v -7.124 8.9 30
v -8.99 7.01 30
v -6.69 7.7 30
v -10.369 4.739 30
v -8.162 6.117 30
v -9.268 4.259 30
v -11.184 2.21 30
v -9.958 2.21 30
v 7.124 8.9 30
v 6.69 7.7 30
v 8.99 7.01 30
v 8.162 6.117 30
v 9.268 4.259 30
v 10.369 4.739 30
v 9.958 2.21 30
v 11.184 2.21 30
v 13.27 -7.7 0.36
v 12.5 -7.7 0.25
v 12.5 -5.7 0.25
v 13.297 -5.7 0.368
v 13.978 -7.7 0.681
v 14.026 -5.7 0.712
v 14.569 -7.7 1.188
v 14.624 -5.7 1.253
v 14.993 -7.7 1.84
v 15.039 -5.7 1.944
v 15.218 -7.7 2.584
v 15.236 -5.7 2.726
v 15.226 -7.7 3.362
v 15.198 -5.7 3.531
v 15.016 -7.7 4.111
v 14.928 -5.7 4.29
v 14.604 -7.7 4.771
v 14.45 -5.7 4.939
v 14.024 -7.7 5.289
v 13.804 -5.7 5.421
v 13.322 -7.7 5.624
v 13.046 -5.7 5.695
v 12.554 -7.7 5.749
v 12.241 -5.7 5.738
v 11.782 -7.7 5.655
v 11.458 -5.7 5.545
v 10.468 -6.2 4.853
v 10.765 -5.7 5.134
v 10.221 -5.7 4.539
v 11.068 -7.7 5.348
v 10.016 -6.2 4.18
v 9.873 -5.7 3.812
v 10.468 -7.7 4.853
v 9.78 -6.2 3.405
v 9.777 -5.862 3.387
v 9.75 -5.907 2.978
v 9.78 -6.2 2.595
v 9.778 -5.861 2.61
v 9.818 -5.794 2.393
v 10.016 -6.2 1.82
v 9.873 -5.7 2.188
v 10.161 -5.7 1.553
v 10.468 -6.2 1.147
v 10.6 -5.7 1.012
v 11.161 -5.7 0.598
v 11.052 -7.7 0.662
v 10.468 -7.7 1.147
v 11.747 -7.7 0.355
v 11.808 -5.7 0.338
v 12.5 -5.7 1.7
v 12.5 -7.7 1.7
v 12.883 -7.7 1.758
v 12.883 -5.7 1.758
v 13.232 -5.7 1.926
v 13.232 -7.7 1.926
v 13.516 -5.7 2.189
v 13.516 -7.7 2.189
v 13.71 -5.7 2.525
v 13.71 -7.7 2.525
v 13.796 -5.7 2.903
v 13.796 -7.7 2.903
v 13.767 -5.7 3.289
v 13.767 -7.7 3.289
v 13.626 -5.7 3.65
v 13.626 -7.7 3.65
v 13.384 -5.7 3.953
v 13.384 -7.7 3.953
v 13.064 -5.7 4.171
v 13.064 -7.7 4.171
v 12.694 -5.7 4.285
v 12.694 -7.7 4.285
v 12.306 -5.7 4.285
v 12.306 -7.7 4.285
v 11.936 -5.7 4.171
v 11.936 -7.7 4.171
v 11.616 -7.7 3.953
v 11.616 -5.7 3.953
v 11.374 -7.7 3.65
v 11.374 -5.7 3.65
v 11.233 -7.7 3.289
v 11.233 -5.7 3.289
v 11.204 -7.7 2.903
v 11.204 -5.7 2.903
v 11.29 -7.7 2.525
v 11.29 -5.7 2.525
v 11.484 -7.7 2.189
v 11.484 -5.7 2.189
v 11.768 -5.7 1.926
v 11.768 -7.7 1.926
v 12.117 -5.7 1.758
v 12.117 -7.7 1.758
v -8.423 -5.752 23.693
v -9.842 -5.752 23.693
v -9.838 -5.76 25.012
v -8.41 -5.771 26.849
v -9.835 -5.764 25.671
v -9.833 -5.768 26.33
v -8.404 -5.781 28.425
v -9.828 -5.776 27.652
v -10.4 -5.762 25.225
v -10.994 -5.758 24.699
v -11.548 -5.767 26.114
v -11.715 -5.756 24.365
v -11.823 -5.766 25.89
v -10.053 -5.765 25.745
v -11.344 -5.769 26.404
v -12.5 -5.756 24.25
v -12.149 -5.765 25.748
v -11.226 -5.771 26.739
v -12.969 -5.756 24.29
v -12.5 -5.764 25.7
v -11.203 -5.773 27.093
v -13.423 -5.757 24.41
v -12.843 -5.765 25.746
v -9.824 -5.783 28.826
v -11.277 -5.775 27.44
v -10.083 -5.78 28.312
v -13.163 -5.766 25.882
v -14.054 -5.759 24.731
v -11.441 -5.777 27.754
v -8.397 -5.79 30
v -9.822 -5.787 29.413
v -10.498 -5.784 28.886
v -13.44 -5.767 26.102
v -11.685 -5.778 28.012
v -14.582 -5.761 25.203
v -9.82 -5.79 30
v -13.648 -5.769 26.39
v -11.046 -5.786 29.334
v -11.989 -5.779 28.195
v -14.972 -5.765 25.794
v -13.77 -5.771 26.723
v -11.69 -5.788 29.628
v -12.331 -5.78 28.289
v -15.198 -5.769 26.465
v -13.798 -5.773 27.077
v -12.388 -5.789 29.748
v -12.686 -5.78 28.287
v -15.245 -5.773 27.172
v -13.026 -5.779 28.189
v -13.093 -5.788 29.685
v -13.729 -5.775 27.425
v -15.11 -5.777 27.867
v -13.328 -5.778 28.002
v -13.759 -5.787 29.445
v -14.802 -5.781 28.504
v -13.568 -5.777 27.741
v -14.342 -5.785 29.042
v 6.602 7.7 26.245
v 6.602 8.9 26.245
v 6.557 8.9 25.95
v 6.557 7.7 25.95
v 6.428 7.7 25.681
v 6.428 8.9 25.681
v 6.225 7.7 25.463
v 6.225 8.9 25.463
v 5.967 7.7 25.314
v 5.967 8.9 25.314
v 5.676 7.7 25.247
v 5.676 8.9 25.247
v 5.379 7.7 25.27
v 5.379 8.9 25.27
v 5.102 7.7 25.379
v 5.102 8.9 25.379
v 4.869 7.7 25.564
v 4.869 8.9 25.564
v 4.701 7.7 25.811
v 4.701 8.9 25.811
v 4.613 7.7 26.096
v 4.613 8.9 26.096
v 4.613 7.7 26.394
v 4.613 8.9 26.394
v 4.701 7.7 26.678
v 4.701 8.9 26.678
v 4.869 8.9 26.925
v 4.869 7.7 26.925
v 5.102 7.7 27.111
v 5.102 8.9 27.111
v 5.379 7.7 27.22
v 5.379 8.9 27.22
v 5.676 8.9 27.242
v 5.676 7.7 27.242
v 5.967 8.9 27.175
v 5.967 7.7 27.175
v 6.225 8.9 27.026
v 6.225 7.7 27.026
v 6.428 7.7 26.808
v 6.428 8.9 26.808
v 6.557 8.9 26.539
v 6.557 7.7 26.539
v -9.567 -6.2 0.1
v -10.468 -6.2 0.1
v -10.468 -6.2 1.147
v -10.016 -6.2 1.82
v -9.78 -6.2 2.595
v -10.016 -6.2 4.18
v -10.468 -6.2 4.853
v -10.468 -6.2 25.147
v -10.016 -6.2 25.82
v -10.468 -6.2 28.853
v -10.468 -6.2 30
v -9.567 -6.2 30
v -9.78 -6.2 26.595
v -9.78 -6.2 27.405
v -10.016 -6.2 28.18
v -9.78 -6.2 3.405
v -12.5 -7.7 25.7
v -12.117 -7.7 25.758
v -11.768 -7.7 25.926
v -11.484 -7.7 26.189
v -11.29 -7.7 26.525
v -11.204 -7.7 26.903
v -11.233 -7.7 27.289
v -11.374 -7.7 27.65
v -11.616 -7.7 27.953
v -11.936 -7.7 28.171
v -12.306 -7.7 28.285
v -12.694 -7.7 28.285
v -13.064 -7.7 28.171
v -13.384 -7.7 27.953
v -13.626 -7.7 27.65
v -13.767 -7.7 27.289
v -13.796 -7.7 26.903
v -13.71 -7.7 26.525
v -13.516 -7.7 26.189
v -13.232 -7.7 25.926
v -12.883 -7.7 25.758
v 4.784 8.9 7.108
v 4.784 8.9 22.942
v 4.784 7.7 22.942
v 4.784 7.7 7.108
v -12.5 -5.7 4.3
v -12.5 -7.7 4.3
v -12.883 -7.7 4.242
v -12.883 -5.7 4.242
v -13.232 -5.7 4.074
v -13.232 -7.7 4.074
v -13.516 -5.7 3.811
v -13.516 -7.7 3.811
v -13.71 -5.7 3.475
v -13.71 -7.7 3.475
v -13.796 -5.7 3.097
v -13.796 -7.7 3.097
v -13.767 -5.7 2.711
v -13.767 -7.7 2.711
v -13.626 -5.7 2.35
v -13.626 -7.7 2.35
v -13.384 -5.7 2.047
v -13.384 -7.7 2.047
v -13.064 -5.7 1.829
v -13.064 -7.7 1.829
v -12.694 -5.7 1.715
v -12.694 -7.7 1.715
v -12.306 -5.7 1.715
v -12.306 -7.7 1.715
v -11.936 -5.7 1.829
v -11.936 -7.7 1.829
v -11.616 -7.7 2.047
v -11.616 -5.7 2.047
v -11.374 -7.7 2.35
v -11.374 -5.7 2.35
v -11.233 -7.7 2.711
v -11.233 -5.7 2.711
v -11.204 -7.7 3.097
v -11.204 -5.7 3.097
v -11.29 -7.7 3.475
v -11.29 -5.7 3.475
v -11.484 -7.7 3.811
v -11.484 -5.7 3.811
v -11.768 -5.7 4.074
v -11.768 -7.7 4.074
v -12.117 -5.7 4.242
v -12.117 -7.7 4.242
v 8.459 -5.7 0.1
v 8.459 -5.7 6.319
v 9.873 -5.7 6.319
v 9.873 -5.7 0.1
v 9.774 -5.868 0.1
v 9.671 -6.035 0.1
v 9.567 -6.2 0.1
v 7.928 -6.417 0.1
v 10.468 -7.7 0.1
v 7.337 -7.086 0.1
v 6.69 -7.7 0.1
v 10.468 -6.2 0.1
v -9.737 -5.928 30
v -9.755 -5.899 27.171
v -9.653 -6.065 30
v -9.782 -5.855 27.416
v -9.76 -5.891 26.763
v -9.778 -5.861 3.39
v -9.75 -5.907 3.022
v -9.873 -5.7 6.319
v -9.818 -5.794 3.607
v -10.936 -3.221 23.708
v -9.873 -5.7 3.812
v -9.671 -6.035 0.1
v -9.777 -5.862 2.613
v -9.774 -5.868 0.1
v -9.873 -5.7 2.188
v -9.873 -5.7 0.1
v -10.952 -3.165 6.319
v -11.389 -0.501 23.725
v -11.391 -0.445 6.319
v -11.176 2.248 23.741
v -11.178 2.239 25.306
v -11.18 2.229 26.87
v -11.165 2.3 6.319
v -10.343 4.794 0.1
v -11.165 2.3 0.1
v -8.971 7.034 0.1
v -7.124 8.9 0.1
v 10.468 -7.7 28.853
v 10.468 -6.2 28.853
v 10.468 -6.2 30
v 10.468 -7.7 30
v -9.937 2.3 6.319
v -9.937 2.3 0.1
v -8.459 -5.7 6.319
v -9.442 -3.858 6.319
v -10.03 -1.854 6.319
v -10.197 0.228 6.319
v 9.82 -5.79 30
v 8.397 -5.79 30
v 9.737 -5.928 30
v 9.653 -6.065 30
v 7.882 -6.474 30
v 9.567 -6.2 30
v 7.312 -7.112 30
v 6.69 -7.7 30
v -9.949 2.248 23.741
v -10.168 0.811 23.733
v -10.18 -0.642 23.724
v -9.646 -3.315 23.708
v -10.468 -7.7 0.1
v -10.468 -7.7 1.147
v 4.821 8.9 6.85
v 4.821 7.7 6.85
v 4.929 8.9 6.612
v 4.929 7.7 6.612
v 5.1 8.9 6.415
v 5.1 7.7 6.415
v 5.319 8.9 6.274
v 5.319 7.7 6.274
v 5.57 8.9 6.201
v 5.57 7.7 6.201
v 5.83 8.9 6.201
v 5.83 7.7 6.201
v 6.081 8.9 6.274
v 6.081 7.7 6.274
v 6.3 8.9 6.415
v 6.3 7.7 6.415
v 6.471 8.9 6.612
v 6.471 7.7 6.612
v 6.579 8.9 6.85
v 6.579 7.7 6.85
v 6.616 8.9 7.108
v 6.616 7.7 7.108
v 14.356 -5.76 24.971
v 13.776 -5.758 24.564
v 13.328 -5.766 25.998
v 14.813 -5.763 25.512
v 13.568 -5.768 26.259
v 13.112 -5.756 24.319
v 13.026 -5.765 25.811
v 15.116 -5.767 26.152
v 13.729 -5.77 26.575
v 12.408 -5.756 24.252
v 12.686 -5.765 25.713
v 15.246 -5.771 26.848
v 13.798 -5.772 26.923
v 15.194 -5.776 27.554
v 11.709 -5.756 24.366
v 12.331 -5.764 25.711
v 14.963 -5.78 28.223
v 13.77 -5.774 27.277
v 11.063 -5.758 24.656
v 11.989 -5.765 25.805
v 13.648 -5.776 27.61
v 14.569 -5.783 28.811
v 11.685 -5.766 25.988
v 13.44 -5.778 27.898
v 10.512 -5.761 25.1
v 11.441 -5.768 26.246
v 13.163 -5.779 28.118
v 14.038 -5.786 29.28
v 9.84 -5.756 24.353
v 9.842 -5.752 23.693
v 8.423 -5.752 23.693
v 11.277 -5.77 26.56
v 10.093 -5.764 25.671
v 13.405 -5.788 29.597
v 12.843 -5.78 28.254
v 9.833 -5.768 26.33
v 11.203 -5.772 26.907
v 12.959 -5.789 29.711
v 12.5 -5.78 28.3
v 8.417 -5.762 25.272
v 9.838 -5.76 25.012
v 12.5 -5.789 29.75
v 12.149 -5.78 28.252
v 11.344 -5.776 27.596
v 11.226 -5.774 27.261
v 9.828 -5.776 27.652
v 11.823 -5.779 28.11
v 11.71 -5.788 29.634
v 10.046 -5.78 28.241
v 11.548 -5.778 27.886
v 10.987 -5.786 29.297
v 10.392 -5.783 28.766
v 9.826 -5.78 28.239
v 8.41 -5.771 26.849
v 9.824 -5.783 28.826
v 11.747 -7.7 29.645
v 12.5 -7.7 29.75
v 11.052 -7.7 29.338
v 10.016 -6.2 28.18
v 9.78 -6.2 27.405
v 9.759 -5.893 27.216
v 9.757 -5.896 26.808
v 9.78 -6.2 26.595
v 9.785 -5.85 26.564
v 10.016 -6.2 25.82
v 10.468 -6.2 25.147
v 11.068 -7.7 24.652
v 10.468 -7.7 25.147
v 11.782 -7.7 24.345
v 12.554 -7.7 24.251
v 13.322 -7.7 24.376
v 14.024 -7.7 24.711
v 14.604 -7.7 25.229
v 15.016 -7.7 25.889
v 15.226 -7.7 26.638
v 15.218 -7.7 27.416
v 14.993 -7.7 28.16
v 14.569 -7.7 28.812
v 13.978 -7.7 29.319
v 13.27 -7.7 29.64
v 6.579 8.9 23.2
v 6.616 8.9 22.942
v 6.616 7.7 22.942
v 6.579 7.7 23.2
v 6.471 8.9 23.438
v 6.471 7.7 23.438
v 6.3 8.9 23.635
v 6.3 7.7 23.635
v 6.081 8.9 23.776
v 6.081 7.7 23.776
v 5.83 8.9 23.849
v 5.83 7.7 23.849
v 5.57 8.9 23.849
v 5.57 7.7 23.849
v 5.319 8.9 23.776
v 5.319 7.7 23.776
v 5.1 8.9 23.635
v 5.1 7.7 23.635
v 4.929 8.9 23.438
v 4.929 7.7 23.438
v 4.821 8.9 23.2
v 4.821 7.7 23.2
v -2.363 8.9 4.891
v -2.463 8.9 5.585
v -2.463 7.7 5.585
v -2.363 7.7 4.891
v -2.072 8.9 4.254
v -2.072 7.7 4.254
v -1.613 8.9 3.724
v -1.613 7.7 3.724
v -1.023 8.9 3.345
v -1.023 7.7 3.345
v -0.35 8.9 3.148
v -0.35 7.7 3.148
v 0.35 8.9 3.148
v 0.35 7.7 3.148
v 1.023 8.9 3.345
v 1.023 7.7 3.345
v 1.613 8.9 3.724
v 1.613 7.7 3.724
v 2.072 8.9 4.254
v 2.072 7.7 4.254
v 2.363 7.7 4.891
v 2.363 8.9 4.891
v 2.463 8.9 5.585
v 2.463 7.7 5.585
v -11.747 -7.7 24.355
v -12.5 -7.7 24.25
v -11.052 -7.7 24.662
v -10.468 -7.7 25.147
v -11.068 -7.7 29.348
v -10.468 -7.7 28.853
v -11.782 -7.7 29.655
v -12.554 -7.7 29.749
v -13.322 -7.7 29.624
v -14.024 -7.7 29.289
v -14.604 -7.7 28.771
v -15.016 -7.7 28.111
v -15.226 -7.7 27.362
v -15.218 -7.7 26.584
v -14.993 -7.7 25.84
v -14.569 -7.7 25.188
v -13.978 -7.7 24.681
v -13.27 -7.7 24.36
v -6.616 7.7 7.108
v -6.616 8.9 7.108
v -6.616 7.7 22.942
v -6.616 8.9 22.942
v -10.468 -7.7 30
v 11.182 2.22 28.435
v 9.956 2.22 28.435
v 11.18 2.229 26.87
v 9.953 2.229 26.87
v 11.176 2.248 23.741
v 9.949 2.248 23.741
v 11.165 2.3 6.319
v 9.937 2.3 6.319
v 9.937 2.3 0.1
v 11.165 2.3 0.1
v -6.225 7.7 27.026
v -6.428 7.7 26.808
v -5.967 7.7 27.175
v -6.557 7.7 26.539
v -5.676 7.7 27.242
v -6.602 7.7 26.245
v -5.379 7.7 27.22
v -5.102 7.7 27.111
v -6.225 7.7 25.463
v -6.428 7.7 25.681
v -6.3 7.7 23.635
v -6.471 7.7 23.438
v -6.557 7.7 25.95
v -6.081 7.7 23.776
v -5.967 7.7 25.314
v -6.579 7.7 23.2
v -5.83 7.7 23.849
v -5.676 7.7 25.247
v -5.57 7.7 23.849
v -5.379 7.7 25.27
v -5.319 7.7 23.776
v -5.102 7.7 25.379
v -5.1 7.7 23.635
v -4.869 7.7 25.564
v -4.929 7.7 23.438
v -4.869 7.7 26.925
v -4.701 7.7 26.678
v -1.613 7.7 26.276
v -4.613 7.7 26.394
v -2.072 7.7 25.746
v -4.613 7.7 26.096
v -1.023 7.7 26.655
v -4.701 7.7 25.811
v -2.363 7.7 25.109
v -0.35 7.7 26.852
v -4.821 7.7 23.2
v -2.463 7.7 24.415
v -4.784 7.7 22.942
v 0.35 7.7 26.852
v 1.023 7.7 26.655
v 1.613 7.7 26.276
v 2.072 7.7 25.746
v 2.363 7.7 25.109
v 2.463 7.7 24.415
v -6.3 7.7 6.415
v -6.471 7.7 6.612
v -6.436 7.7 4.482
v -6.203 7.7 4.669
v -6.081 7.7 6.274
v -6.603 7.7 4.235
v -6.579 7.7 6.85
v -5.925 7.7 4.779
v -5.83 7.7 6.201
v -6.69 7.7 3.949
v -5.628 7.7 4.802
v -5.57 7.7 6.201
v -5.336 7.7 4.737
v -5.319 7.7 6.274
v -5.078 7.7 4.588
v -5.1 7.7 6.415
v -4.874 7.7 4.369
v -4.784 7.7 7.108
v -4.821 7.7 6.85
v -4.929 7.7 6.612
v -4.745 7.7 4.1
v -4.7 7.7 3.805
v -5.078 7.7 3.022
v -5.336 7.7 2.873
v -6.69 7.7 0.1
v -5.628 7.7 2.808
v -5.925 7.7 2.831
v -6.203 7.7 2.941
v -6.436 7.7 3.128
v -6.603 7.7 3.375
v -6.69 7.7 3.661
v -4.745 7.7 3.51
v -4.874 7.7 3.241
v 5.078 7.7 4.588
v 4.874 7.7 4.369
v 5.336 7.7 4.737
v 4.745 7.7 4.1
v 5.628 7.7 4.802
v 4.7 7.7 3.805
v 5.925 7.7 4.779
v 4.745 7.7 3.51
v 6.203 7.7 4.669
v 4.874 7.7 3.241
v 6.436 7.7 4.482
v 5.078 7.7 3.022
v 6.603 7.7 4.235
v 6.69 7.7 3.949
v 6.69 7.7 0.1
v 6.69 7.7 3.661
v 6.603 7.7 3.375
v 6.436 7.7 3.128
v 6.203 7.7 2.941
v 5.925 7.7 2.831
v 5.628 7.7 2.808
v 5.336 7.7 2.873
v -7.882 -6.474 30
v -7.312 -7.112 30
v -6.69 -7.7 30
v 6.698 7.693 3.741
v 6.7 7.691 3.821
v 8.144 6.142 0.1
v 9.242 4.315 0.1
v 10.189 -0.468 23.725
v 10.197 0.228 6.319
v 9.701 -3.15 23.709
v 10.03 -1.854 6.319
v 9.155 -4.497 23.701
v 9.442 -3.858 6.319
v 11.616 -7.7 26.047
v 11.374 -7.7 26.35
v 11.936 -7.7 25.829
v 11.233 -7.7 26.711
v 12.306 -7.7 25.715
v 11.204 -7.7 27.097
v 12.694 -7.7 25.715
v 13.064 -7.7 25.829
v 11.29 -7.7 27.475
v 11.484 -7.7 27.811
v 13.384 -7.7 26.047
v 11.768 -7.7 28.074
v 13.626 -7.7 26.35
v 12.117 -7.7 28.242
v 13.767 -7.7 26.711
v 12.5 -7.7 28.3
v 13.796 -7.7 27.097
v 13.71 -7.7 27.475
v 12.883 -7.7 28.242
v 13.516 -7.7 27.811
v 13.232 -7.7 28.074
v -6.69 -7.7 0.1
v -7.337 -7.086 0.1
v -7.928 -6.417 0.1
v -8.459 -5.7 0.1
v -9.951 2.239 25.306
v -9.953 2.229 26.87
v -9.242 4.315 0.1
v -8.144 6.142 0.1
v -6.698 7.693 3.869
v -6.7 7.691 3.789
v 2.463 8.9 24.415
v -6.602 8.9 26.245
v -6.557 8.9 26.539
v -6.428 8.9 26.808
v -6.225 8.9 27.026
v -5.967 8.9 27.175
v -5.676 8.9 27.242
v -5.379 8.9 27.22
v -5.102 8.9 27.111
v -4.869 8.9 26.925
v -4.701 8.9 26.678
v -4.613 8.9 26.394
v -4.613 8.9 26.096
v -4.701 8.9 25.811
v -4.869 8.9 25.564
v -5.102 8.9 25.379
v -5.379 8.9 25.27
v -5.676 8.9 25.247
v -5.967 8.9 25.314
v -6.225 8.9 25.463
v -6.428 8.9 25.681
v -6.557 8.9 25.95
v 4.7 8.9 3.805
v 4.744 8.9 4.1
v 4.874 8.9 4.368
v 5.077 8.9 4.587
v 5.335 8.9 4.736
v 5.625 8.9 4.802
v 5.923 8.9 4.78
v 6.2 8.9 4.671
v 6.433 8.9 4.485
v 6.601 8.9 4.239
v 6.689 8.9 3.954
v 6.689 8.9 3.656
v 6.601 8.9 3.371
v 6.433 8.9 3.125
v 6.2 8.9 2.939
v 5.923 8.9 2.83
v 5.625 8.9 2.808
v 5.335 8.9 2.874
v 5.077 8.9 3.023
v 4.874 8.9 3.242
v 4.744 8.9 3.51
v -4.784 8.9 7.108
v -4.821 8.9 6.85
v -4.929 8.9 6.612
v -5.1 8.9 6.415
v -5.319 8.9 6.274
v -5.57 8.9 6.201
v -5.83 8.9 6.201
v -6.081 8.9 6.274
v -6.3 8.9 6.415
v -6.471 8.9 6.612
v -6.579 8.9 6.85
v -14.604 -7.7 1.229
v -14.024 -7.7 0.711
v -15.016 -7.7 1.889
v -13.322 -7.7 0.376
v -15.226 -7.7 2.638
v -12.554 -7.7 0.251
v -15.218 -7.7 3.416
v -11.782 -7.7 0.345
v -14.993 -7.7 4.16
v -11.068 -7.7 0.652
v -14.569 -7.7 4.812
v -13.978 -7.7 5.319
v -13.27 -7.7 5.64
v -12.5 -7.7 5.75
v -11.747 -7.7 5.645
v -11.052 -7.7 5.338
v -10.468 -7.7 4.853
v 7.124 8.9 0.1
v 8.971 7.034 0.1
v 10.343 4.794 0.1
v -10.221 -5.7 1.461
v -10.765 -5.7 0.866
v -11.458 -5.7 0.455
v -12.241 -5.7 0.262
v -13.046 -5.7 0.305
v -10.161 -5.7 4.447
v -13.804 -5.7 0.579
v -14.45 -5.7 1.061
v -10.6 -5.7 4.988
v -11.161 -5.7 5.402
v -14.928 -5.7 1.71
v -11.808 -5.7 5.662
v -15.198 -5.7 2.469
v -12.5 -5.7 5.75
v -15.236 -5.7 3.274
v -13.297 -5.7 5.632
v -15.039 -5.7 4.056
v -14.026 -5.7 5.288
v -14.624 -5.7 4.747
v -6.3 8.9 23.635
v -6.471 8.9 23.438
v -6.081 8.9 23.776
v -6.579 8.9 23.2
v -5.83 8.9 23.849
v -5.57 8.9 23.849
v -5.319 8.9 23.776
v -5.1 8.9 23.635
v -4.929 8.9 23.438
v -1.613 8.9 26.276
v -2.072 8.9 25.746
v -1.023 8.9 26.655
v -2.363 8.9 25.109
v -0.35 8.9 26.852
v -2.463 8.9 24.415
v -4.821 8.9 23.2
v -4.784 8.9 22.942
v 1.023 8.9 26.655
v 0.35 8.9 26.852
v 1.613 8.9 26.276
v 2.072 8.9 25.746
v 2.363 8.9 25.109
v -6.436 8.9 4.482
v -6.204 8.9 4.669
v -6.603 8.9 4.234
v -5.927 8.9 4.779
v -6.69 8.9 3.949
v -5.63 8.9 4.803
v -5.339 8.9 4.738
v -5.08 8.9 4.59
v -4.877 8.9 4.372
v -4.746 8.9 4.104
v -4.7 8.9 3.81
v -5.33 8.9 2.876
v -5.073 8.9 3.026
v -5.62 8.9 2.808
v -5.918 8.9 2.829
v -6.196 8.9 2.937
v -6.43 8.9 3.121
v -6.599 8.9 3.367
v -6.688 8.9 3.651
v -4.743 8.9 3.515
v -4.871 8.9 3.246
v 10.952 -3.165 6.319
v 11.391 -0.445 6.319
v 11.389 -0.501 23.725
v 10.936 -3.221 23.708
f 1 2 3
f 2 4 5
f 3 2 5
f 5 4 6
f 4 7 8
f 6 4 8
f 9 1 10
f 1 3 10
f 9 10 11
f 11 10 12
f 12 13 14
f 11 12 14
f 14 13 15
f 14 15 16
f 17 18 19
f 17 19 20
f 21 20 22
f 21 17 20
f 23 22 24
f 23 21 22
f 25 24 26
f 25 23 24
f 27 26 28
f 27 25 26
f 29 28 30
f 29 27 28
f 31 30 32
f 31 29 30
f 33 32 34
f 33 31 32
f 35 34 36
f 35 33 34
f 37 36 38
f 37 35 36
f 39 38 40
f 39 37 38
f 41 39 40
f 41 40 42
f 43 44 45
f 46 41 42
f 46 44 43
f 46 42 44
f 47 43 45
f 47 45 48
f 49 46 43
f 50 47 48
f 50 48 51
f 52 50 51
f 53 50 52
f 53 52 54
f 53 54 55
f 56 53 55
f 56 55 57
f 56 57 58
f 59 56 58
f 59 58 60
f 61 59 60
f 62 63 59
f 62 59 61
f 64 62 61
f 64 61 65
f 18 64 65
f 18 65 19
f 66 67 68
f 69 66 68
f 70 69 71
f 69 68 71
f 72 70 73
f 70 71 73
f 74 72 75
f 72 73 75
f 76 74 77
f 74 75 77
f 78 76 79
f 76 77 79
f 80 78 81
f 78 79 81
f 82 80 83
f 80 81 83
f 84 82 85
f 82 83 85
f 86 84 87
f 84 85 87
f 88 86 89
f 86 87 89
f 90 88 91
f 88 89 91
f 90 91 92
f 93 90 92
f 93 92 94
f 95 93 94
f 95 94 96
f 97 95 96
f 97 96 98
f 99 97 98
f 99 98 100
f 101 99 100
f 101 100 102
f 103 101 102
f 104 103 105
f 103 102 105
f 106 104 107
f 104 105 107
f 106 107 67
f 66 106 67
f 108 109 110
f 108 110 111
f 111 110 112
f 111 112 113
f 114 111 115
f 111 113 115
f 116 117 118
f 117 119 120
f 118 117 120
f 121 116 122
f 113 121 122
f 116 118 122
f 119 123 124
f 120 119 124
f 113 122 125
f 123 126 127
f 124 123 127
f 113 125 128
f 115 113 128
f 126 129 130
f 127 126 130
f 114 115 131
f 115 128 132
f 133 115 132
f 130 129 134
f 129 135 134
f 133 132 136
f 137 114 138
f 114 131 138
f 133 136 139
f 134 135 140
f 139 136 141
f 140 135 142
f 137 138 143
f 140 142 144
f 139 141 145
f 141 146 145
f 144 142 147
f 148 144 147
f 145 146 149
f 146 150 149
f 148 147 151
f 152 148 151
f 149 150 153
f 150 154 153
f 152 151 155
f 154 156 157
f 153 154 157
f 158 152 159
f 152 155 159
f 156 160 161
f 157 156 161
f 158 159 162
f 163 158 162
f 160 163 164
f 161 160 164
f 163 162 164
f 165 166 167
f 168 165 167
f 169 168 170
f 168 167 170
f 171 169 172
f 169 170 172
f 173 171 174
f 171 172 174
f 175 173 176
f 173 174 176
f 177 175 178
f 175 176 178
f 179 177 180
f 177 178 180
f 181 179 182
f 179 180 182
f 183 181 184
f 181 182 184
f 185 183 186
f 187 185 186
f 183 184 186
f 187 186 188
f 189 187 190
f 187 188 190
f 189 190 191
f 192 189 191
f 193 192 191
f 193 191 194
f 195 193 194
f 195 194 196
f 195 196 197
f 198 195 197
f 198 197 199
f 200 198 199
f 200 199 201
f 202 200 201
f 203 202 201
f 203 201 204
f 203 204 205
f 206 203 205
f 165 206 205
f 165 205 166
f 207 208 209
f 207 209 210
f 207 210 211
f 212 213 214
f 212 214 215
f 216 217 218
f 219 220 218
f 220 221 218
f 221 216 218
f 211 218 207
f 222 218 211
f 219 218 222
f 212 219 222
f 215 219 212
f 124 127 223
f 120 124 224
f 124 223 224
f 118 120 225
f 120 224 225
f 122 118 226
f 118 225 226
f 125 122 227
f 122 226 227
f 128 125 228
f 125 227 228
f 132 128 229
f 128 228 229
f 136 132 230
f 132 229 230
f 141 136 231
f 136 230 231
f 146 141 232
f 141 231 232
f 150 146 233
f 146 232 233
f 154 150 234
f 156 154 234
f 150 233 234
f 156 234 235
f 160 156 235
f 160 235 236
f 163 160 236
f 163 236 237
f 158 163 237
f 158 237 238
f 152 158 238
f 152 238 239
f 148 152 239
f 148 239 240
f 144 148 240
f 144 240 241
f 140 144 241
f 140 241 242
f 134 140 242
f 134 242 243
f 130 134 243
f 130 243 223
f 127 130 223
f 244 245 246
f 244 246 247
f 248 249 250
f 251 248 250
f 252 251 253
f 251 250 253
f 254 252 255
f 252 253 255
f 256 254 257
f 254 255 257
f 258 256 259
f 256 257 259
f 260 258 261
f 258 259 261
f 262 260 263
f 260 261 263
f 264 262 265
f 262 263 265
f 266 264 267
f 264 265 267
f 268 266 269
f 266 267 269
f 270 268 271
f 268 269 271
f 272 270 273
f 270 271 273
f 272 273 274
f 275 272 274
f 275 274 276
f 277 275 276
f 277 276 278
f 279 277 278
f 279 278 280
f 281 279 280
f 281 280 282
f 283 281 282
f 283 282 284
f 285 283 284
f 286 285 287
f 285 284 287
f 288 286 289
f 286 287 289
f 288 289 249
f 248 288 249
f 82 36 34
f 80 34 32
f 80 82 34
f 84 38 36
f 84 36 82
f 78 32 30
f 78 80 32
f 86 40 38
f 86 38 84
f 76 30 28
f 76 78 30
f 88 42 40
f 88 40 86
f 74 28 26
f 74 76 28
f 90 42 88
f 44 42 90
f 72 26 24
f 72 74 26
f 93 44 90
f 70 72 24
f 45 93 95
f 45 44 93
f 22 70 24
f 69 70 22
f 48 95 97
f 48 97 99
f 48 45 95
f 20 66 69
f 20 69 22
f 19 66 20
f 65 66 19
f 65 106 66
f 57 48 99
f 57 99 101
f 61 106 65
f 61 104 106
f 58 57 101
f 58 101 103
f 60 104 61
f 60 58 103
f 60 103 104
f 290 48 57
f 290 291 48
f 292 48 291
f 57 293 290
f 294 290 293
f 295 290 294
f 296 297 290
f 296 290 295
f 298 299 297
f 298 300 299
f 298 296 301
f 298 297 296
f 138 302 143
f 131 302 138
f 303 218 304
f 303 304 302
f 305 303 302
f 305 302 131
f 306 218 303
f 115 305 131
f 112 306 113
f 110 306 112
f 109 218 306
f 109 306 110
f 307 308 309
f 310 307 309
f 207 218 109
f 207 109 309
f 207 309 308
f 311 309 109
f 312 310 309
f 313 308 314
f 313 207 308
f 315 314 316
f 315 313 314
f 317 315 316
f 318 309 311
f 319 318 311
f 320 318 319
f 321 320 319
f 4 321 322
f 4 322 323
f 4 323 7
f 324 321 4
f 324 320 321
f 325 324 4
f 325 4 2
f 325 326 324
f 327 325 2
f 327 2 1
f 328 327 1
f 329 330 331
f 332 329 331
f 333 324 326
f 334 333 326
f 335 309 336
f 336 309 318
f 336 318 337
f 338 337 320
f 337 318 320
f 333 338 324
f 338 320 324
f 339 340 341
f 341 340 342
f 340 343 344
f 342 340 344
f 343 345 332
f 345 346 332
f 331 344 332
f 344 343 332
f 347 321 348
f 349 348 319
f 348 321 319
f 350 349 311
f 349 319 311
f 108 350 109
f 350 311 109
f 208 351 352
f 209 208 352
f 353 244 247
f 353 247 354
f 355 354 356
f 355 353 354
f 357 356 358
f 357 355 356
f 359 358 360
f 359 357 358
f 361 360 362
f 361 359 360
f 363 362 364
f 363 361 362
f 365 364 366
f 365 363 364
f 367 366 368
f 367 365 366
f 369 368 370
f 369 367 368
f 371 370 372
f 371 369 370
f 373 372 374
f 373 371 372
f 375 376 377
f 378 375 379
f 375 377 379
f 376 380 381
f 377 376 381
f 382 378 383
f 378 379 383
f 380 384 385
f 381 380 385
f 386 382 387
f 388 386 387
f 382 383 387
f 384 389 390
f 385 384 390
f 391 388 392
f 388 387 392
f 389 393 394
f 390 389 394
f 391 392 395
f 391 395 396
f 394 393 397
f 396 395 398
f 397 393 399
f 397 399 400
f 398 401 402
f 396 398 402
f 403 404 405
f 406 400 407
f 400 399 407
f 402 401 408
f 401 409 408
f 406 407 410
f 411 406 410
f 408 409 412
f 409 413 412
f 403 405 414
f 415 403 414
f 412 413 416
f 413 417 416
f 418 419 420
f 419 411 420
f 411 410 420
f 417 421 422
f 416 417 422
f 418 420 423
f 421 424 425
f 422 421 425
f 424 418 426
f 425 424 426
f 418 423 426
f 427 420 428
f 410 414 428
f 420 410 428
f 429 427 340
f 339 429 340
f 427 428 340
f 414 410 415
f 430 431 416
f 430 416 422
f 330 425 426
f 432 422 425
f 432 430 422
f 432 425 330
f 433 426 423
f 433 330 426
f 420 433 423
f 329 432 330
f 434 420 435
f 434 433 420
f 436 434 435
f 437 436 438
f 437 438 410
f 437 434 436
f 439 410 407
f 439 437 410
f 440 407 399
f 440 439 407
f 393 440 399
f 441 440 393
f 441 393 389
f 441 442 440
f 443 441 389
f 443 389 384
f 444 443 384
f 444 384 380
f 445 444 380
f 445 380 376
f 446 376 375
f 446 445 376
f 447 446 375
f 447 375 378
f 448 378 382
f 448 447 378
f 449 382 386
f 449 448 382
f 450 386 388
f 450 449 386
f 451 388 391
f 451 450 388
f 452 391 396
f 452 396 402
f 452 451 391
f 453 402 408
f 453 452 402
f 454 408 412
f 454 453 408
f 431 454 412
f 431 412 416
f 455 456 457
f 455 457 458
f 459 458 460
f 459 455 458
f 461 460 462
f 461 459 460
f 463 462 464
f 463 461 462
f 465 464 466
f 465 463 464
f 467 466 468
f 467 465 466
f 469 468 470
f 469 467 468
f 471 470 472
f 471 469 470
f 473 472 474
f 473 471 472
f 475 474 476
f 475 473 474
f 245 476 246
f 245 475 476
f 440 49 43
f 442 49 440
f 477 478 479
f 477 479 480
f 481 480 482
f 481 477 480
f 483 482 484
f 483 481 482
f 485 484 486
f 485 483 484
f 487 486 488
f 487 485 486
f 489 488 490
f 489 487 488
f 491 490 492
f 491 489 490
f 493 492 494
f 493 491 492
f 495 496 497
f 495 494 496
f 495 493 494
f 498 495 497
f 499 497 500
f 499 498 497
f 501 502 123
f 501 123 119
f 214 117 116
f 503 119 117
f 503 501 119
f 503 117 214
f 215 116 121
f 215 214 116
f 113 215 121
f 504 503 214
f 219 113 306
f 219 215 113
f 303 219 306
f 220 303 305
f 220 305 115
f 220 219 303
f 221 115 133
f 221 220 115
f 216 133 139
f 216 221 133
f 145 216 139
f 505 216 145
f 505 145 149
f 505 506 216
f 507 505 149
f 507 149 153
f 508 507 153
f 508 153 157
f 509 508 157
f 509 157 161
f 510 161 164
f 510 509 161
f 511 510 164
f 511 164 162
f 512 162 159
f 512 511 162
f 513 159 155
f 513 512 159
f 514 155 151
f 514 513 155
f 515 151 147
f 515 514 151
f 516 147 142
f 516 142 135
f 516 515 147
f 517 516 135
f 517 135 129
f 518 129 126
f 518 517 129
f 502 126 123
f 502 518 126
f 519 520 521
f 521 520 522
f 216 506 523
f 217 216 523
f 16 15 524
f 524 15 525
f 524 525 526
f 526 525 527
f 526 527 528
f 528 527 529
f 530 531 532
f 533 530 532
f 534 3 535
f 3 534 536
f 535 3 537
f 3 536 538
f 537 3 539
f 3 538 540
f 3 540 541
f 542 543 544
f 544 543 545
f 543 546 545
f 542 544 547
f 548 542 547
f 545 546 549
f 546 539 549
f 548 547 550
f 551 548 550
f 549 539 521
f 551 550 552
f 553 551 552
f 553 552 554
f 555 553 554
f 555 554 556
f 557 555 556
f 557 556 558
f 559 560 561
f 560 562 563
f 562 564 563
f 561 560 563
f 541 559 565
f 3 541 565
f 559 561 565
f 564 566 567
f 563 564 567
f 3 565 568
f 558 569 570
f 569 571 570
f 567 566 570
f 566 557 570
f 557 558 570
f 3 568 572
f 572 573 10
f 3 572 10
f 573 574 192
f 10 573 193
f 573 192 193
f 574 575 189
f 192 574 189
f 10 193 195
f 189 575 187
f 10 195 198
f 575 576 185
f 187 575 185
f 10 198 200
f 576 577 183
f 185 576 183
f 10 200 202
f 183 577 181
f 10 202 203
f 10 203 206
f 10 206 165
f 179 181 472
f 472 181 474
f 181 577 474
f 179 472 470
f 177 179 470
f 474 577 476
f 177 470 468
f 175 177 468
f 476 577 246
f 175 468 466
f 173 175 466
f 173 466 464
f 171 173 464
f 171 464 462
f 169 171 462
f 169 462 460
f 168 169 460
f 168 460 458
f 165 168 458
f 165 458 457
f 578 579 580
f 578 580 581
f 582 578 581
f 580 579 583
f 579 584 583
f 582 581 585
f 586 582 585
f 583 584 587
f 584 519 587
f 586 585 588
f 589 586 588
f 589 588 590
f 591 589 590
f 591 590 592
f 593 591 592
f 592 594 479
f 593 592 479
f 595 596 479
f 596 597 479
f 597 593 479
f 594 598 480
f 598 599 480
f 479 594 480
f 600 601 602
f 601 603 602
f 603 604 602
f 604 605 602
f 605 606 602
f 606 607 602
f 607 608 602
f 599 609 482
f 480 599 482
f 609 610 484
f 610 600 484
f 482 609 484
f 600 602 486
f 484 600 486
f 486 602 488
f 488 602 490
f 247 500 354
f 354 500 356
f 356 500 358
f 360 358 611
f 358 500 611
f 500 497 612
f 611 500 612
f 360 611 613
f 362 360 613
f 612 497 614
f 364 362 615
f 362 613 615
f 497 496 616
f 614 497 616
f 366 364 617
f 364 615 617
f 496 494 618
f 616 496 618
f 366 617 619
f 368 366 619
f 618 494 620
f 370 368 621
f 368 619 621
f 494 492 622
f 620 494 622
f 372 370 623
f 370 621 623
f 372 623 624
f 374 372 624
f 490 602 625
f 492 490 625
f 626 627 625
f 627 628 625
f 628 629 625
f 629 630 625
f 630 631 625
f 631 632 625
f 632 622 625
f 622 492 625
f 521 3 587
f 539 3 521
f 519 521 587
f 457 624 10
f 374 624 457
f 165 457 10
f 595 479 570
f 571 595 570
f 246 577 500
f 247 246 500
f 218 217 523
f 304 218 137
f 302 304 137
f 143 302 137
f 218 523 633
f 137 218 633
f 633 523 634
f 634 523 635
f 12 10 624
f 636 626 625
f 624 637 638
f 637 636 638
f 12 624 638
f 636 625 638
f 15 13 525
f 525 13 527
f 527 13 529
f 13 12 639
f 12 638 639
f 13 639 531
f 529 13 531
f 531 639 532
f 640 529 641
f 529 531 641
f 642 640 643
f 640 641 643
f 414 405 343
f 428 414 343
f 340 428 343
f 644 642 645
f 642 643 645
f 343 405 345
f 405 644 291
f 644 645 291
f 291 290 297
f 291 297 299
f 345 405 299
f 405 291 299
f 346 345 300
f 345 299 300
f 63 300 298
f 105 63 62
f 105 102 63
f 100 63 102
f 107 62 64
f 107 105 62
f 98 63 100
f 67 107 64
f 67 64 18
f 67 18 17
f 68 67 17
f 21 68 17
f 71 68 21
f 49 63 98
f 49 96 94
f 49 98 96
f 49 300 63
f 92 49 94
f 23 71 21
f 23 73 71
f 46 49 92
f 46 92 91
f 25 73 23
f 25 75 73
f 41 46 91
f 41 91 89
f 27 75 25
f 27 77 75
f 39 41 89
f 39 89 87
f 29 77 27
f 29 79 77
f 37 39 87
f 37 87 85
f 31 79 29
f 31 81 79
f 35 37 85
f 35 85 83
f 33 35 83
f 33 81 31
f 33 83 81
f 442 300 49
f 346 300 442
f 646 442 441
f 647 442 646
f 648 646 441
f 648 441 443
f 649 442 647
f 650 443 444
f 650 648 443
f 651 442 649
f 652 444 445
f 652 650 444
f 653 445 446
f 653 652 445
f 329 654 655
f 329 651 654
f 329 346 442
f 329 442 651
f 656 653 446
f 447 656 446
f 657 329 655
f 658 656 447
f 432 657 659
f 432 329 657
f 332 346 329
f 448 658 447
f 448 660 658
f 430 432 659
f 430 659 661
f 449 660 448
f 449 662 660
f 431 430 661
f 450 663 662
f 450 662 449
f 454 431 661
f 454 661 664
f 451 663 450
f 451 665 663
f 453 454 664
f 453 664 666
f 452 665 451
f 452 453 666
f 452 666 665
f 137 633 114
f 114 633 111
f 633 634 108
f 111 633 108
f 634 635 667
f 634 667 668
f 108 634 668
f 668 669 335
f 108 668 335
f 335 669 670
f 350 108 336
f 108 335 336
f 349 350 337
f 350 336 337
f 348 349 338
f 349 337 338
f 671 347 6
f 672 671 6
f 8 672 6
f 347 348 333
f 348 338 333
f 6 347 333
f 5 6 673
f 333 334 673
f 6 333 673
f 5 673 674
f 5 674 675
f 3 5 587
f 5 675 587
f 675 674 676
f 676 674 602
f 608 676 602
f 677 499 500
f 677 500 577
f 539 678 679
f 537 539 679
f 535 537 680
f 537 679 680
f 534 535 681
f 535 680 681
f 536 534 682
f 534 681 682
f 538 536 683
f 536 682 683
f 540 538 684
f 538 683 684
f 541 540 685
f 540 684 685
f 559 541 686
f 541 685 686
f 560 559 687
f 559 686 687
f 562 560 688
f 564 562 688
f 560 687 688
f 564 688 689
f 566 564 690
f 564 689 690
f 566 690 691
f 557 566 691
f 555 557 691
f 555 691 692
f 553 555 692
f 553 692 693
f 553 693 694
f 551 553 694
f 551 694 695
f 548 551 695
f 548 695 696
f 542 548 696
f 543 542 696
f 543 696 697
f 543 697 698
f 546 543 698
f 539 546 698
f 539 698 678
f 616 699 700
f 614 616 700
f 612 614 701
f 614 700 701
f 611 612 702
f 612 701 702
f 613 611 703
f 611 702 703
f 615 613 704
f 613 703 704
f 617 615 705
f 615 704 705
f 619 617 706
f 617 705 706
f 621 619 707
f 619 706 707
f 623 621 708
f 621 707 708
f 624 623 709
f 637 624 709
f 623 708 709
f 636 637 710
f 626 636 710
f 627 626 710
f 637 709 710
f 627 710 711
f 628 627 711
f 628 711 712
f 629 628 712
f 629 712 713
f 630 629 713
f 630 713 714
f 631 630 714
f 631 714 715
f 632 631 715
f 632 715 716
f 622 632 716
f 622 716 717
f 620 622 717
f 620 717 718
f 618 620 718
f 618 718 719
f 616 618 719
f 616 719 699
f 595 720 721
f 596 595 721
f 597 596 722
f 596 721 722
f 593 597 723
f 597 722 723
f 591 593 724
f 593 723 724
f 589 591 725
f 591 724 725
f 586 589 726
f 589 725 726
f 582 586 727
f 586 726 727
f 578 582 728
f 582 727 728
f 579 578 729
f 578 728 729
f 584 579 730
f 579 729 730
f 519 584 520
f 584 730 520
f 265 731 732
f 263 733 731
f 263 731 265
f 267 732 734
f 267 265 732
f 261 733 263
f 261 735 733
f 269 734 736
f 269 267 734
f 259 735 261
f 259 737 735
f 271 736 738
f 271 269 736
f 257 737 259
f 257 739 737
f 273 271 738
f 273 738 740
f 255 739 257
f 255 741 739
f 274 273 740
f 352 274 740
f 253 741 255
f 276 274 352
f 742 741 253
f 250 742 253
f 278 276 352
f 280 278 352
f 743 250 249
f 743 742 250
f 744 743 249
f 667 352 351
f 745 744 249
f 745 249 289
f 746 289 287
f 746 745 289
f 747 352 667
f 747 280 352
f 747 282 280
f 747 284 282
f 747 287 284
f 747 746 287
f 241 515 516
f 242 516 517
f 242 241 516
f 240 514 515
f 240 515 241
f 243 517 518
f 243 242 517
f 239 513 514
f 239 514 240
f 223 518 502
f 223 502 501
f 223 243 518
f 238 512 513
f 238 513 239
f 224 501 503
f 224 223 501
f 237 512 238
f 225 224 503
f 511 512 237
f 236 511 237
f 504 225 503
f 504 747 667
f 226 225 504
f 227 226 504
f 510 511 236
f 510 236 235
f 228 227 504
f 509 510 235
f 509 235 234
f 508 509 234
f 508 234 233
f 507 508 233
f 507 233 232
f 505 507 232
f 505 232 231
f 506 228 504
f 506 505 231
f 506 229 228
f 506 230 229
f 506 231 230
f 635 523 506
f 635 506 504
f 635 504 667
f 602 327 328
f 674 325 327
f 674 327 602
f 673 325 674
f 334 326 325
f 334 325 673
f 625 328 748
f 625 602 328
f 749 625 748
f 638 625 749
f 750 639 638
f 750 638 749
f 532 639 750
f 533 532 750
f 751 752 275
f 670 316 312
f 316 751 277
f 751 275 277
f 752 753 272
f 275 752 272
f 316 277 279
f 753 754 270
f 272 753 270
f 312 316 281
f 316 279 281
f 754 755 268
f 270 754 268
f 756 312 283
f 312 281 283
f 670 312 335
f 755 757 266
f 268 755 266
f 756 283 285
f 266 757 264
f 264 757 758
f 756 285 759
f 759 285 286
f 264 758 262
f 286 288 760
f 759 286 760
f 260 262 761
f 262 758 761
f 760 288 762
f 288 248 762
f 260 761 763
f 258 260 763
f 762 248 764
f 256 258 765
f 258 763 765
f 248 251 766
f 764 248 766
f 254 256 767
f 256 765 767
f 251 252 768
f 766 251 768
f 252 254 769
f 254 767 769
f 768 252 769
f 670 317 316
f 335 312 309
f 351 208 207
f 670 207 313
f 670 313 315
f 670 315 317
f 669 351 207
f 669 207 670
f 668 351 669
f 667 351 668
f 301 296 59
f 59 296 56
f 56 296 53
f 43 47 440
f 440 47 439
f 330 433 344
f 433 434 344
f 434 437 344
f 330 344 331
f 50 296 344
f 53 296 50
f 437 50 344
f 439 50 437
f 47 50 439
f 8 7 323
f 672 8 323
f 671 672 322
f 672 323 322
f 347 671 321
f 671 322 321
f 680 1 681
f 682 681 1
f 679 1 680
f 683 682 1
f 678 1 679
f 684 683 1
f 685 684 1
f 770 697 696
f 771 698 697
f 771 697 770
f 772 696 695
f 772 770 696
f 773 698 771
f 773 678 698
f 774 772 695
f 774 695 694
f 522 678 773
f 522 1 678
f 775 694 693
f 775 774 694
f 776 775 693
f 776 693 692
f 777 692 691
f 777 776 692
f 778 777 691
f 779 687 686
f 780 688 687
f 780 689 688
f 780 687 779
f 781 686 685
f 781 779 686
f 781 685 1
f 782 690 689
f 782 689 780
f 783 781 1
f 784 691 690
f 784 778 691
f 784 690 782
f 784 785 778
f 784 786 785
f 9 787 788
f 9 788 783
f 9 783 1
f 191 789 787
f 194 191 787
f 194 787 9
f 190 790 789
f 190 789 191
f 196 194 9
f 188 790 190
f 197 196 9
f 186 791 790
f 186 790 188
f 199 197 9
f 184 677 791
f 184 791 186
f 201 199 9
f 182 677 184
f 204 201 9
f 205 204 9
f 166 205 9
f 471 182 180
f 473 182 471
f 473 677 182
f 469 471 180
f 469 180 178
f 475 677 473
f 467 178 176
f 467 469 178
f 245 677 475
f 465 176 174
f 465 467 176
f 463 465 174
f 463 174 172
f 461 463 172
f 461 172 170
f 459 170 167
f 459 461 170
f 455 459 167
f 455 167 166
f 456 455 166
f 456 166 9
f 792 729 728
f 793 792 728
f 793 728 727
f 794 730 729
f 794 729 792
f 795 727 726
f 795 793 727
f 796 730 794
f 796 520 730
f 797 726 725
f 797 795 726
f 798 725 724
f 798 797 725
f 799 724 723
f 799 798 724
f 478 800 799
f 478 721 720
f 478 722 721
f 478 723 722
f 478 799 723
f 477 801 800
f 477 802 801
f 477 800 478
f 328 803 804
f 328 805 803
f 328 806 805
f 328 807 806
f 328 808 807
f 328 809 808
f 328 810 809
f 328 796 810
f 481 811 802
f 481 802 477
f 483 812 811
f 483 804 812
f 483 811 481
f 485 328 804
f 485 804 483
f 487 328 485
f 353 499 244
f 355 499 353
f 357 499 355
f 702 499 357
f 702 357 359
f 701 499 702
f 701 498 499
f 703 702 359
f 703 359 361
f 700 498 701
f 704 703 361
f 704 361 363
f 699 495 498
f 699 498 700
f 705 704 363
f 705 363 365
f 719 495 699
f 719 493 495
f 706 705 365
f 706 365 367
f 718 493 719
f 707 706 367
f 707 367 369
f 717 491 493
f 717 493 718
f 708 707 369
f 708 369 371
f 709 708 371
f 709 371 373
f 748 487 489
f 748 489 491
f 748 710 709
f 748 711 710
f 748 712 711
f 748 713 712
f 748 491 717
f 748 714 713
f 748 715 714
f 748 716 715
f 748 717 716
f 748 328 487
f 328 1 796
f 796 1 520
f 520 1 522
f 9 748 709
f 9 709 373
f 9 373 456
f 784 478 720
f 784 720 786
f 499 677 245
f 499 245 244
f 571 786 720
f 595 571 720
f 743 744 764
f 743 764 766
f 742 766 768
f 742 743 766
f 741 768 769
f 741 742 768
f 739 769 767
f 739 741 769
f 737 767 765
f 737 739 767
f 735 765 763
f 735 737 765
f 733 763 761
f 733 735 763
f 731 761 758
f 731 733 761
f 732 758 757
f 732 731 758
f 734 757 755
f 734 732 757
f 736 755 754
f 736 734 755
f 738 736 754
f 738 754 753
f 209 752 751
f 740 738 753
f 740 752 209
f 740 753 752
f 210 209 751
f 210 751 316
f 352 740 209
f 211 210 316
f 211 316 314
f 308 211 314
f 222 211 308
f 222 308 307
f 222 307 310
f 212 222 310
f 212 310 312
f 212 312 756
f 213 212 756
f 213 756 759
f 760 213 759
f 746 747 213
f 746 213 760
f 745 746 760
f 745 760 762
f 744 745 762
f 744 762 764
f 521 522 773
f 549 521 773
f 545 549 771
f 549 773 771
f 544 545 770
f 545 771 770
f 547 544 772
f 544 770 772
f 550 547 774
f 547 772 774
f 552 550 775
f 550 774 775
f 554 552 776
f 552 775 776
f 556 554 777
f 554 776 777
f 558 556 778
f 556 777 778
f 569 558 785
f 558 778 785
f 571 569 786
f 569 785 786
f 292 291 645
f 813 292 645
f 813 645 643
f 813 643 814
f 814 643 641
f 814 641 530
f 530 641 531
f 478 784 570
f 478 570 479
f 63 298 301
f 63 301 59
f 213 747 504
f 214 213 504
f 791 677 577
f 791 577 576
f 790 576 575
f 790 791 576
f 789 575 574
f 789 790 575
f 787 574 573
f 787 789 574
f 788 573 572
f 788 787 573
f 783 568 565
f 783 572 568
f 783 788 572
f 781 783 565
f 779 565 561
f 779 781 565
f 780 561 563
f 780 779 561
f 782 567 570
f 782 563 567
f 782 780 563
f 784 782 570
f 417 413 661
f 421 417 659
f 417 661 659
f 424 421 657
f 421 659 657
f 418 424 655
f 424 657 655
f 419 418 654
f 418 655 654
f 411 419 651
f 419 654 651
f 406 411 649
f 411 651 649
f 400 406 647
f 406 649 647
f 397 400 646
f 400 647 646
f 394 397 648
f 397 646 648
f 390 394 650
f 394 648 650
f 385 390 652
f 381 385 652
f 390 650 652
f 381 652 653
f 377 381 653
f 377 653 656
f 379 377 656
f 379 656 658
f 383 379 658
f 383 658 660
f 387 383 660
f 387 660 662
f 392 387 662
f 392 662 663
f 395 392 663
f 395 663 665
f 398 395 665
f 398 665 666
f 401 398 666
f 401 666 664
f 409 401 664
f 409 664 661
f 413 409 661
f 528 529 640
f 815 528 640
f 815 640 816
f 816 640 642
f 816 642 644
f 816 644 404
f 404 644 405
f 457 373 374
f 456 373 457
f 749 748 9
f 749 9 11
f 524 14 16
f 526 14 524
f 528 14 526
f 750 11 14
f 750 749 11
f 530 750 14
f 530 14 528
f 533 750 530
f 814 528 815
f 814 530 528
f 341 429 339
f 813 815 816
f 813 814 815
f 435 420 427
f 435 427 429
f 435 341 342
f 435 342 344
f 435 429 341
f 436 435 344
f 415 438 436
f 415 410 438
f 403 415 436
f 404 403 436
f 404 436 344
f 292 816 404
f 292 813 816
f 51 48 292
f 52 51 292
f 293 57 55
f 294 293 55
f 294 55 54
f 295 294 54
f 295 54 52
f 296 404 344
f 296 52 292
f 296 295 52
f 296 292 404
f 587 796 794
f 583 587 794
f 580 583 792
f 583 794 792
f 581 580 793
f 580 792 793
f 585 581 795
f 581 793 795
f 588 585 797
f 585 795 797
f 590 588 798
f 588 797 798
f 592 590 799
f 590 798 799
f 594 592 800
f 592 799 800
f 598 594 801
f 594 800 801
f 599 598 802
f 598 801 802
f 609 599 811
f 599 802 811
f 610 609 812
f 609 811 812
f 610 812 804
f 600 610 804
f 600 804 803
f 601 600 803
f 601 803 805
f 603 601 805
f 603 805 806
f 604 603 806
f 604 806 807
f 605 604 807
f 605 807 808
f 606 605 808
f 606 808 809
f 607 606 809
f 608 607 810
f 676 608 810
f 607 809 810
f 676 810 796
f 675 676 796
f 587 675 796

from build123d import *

# Parameters (mm, degrees)
SALIENTE_EXTRUIR1_DEPTH    = 30
VACIADO1_T                 = 1.2
CROQUIS2_W                 = 41.64599518
CROQUIS2_H                 = 31.401201606
CORTAR_EXTRUIR1_DEPTH      = 1.3
CROQUIS3_W                 = 19.002401527
CROQUIS3_H                 = 2.972205444
CORTAR_EXTRUIR2_DEPTH      = 48.3
CROQUIS4_R                 = 2.75
CROQUIS4_R_2               = 1.3
SALIENTE_EXTRUIR2_DEPTH    = 2
SALIENTE_EXTRUIR2_2_DEPTH  = 2
SALIENTE_EXTRUIR2_3_DEPTH  = 2
SALIENTE_EXTRUIR2_4_DEPTH  = 2
CROQUIS5_W                 = 2.061100057
CROQUIS5_H                 = 29.9
SALIENTE_EXTRUIR3_DEPTH    = 1.5
CROQUIS6_R                 = 1
CORTAR_EXTRUIR3_DEPTH      = 7
CORTAR_EXTRUIR4_DEPTH      = 30
CORTAR_EXTRUIR4_DEPTH_BACK = 32
CROQUIS9_W                 = 7.787362377
CROQUIS9_H                 = 8.000416911


with BuildPart() as part:
    # Croquis1 → Saliente-Extruir1 (new body)
    with BuildSketch(Plane.XY):
        with BuildLine():
            Line((-6.68954408, 7.7), (6.68954408, 7.7))
            ThreePointArc((6.68954408, 7.7), (10.2, 0), (6.68954408, -7.7))
            Line((6.68954408, -7.7), (-6.68954408, -7.7))
            ThreePointArc((-6.68954408, -7.7), (-10.2, 0), (-6.68954408, 7.7))
        make_face()
    extrude(amount=SALIENTE_EXTRUIR1_DEPTH)

    # Vaciado1
    vaciado1_openings = [part.faces().sort_by_distance(p)[0] for p in [
        (0, 0, 30),
    ]]
    offset(amount=VACIADO1_T, openings=vaciado1_openings, kind=Kind.INTERSECTION)

    # Croquis2 → Cortar-Extruir1 (cut)
    with BuildSketch(Plane(origin=(0, 0, -1.2), x_dir=(-1, 0, 0), z_dir=(0, 0, -1))):
        Rectangle(CROQUIS2_W, CROQUIS2_H)
    extrude(amount=-CORTAR_EXTRUIR1_DEPTH, mode=Mode.SUBTRACT)

    # Croquis3 → Cortar-Extruir2 (cut)
    with BuildSketch(Plane.XY.offset(30)):
        with Locations((-0.191367802, -9.186102722)):
            Rectangle(CROQUIS3_W, CROQUIS3_H)
    extrude(amount=-CORTAR_EXTRUIR2_DEPTH, mode=Mode.SUBTRACT)



with BuildPart() as body_2:
    # Croquis4 → Saliente-Extruir2 (new body)
    with BuildSketch(Plane.XZ.offset(7.7)):
        with Locations(Location((12.5, 3, 0), (0, 0, 270))):
            Circle(CROQUIS4_R)
        with Locations(Location((12.5, 3, 0), (0, 0, 270))):
            Circle(CROQUIS4_R_2, mode=Mode.SUBTRACT)
    extrude(amount=-SALIENTE_EXTRUIR2_DEPTH)


with BuildPart() as body_3:
    # Croquis4 → Saliente-Extruir2 2 (new body)
    with BuildSketch(Plane.XZ.offset(7.7)):
        with Locations(Location((12.5, 27, 0), (0, 0, 90))):
            Circle(CROQUIS4_R)
        with Locations(Location((12.5, 27, 0), (0, 0, 90))):
            Circle(CROQUIS4_R_2, mode=Mode.SUBTRACT)
    extrude(amount=-SALIENTE_EXTRUIR2_2_DEPTH)


with BuildPart() as body_4:
    # Croquis4 → Saliente-Extruir2 3 (new body)
    with BuildSketch(Plane.XZ.offset(7.7)):
        with Locations(Location((-12.5, 27, 0), (0, 0, 270))):
            Circle(CROQUIS4_R)
        with Locations(Location((-12.5, 27, 0), (0, 0, 270))):
            Circle(CROQUIS4_R_2, mode=Mode.SUBTRACT)
    extrude(amount=-SALIENTE_EXTRUIR2_3_DEPTH)


with BuildPart() as body_5:
    # Croquis4 → Saliente-Extruir2 4 (new body)
    with BuildSketch(Plane.XZ.offset(7.7)):
        with Locations(Location((-12.5, 3, 0), (0, 0, 90))):
            Circle(CROQUIS4_R)
        with Locations(Location((-12.5, 3, 0), (0, 0, 90))):
            Circle(CROQUIS4_R_2, mode=Mode.SUBTRACT)
    extrude(amount=-SALIENTE_EXTRUIR2_4_DEPTH)


with BuildPart() as part_1:
    add(part.part)

    add(body_2.part)  # Saliente-Extruir3 merges body 2

    add(body_3.part)  # Saliente-Extruir3 merges body 3

    add(body_4.part)  # Saliente-Extruir3 merges body 4

    add(body_5.part)  # Saliente-Extruir3 merges body 5
    # Croquis5 → Saliente-Extruir3 (add)
    with BuildSketch(Plane.XZ.offset(7.7)):
        with Locations((-9.437095098, 15.05)):
            Rectangle(CROQUIS5_W, CROQUIS5_H)
        with Locations((9.437095098, 15.05)):
            Rectangle(CROQUIS5_W, CROQUIS5_H)
    extrude(amount=-SALIENTE_EXTRUIR3_DEPTH)

    # Croquis6 → Cortar-Extruir3 (cut)
    with BuildSketch(Plane(origin=(0, 8.9, 0), x_dir=(1, 0, 0), z_dir=(0, 1, 0))):
        with Locations(Location((5.7, -3.804995741, 0), (0, 0, 180))):
            Circle(CROQUIS6_R)
        with Locations((5.601580803, -26.244572596)):
            Circle(CROQUIS6_R)
        with Locations(Location((-5.7, -3.804995741, 0), (0, 0, 188.292737021))):
            Circle(CROQUIS6_R)
        with Locations(Location((-5.601580803, -26.244572596, 0), (0, 0, 180))):
            Circle(CROQUIS6_R)
        with BuildLine():
            Line((-2.462626263, -24.414792503), (-2.462626263, -5.585207497))
            ThreePointArc((-2.462626263, -5.585207497), (0, -3.122581234), (2.462626263, -5.585207497))
            Line((2.462626263, -5.585207497), (2.462626263, -24.414792503))
            ThreePointArc((2.462626263, -24.414792503), (0, -26.877418766), (-2.462626263, -24.414792503))
        make_face()
        with BuildLine():
            Line((6.616453694, -7.107894038), (6.616453694, -22.942105962))
            ThreePointArc((6.616453694, -22.942105962), (5.7, -23.858559655), (4.783546306, -22.942105962))
            Line((4.783546306, -22.942105962), (4.783546306, -7.107894038))
            ThreePointArc((4.783546306, -7.107894038), (5.7, -6.191440345), (6.616453694, -7.107894038))
        make_face()
        with BuildLine():
            Line((-6.616453694, -7.107894038), (-6.616453694, -22.942105962))
            ThreePointArc((-6.616453694, -22.942105962), (-5.7, -23.858559655), (-4.783546306, -22.942105962))
            Line((-4.783546306, -22.942105962), (-4.783546306, -7.107894038))
            ThreePointArc((-4.783546306, -7.107894038), (-5.7, -6.191440345), (-6.616453694, -7.107894038))
        make_face()
    extrude(amount=-CORTAR_EXTRUIR3_DEPTH, mode=Mode.SUBTRACT)

    # Croquis9 → Cortar-Extruir4 (cut, two sides: drawn at the far end of the back side and taken through both)
    with BuildSketch(Plane(origin=(0, 0, 0), x_dir=(0, 0, -1), z_dir=(1, 0, 0)).offset(-CORTAR_EXTRUIR4_DEPTH_BACK)):
        with Locations((-2.424964561, -1.699791545)):
            Rectangle(CROQUIS9_W, CROQUIS9_H)
        Polygon((-31.528660737, 2.20102722), (-23.741439659, 2.247938616), (-23.693244814, -5.75233313), (-31.480465891, -5.799244526), align=None)
    extrude(amount=CORTAR_EXTRUIR4_DEPTH + CORTAR_EXTRUIR4_DEPTH_BACK, mode=Mode.SUBTRACT)


solid = part_1.part
